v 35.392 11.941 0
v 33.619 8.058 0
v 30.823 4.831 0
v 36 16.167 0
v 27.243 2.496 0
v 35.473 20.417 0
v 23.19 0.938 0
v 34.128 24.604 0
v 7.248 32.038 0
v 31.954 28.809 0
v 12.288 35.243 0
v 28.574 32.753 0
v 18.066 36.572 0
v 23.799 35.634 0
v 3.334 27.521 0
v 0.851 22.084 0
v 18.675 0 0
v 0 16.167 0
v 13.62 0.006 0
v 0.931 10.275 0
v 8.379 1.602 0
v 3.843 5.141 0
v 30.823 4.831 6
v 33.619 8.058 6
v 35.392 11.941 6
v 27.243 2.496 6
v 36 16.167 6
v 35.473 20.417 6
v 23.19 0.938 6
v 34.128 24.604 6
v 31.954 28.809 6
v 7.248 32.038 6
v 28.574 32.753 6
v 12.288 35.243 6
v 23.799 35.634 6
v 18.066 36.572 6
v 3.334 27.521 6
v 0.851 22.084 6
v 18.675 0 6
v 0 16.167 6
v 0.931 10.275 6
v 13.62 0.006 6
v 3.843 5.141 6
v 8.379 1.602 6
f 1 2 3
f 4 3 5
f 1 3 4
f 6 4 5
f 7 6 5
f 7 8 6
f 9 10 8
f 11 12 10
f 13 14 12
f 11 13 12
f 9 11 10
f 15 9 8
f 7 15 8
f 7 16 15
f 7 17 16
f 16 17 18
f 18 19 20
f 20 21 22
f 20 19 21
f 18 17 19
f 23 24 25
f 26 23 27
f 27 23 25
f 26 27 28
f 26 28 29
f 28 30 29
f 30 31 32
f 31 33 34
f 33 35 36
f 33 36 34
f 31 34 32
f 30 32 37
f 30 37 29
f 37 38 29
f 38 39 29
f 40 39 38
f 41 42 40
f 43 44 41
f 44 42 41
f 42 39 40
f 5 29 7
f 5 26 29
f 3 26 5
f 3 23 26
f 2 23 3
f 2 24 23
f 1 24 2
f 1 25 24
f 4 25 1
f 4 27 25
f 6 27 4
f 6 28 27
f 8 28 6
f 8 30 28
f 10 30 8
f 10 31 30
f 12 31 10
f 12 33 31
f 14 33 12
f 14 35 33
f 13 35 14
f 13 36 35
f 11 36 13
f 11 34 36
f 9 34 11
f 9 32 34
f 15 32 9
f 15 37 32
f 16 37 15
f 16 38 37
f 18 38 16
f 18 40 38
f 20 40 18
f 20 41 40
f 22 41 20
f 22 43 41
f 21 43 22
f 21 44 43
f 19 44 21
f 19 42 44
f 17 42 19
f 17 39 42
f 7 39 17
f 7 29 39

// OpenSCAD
$fn = 32;

// ----------------------------------------------------------------------
// Cam disc: base radius 15.0 mm, lift 6.0 mm, 22 profile points
// ----------------------------------------------------------------------

// --- parameters (mm) ---
profile_height = 6;       // extrusion height
profile_points = 22;      // points of the closed outline

profile = [[36, 16.167], [35.473, 20.417], [34.128, 24.604], [31.954, 28.809], [28.574, 32.753], [23.799, 35.634], [18.066, 36.572], [12.288, 35.243], [7.248, 32.038], [3.334, 27.521], [0.851, 22.084], [0, 16.167], [0.931, 10.275], [3.843, 5.141], [8.379, 1.602], [13.62, 0.006], [18.675, 0], [23.19, 0.938], [27.243, 2.496], [30.823, 4.831], [33.619, 8.058], [35.392, 11.941]];  // single closed polygon, 22 points, counter clockwise

// --- the one profile operation ---
linear_extrude(height = profile_height) polygon(points = profile);
